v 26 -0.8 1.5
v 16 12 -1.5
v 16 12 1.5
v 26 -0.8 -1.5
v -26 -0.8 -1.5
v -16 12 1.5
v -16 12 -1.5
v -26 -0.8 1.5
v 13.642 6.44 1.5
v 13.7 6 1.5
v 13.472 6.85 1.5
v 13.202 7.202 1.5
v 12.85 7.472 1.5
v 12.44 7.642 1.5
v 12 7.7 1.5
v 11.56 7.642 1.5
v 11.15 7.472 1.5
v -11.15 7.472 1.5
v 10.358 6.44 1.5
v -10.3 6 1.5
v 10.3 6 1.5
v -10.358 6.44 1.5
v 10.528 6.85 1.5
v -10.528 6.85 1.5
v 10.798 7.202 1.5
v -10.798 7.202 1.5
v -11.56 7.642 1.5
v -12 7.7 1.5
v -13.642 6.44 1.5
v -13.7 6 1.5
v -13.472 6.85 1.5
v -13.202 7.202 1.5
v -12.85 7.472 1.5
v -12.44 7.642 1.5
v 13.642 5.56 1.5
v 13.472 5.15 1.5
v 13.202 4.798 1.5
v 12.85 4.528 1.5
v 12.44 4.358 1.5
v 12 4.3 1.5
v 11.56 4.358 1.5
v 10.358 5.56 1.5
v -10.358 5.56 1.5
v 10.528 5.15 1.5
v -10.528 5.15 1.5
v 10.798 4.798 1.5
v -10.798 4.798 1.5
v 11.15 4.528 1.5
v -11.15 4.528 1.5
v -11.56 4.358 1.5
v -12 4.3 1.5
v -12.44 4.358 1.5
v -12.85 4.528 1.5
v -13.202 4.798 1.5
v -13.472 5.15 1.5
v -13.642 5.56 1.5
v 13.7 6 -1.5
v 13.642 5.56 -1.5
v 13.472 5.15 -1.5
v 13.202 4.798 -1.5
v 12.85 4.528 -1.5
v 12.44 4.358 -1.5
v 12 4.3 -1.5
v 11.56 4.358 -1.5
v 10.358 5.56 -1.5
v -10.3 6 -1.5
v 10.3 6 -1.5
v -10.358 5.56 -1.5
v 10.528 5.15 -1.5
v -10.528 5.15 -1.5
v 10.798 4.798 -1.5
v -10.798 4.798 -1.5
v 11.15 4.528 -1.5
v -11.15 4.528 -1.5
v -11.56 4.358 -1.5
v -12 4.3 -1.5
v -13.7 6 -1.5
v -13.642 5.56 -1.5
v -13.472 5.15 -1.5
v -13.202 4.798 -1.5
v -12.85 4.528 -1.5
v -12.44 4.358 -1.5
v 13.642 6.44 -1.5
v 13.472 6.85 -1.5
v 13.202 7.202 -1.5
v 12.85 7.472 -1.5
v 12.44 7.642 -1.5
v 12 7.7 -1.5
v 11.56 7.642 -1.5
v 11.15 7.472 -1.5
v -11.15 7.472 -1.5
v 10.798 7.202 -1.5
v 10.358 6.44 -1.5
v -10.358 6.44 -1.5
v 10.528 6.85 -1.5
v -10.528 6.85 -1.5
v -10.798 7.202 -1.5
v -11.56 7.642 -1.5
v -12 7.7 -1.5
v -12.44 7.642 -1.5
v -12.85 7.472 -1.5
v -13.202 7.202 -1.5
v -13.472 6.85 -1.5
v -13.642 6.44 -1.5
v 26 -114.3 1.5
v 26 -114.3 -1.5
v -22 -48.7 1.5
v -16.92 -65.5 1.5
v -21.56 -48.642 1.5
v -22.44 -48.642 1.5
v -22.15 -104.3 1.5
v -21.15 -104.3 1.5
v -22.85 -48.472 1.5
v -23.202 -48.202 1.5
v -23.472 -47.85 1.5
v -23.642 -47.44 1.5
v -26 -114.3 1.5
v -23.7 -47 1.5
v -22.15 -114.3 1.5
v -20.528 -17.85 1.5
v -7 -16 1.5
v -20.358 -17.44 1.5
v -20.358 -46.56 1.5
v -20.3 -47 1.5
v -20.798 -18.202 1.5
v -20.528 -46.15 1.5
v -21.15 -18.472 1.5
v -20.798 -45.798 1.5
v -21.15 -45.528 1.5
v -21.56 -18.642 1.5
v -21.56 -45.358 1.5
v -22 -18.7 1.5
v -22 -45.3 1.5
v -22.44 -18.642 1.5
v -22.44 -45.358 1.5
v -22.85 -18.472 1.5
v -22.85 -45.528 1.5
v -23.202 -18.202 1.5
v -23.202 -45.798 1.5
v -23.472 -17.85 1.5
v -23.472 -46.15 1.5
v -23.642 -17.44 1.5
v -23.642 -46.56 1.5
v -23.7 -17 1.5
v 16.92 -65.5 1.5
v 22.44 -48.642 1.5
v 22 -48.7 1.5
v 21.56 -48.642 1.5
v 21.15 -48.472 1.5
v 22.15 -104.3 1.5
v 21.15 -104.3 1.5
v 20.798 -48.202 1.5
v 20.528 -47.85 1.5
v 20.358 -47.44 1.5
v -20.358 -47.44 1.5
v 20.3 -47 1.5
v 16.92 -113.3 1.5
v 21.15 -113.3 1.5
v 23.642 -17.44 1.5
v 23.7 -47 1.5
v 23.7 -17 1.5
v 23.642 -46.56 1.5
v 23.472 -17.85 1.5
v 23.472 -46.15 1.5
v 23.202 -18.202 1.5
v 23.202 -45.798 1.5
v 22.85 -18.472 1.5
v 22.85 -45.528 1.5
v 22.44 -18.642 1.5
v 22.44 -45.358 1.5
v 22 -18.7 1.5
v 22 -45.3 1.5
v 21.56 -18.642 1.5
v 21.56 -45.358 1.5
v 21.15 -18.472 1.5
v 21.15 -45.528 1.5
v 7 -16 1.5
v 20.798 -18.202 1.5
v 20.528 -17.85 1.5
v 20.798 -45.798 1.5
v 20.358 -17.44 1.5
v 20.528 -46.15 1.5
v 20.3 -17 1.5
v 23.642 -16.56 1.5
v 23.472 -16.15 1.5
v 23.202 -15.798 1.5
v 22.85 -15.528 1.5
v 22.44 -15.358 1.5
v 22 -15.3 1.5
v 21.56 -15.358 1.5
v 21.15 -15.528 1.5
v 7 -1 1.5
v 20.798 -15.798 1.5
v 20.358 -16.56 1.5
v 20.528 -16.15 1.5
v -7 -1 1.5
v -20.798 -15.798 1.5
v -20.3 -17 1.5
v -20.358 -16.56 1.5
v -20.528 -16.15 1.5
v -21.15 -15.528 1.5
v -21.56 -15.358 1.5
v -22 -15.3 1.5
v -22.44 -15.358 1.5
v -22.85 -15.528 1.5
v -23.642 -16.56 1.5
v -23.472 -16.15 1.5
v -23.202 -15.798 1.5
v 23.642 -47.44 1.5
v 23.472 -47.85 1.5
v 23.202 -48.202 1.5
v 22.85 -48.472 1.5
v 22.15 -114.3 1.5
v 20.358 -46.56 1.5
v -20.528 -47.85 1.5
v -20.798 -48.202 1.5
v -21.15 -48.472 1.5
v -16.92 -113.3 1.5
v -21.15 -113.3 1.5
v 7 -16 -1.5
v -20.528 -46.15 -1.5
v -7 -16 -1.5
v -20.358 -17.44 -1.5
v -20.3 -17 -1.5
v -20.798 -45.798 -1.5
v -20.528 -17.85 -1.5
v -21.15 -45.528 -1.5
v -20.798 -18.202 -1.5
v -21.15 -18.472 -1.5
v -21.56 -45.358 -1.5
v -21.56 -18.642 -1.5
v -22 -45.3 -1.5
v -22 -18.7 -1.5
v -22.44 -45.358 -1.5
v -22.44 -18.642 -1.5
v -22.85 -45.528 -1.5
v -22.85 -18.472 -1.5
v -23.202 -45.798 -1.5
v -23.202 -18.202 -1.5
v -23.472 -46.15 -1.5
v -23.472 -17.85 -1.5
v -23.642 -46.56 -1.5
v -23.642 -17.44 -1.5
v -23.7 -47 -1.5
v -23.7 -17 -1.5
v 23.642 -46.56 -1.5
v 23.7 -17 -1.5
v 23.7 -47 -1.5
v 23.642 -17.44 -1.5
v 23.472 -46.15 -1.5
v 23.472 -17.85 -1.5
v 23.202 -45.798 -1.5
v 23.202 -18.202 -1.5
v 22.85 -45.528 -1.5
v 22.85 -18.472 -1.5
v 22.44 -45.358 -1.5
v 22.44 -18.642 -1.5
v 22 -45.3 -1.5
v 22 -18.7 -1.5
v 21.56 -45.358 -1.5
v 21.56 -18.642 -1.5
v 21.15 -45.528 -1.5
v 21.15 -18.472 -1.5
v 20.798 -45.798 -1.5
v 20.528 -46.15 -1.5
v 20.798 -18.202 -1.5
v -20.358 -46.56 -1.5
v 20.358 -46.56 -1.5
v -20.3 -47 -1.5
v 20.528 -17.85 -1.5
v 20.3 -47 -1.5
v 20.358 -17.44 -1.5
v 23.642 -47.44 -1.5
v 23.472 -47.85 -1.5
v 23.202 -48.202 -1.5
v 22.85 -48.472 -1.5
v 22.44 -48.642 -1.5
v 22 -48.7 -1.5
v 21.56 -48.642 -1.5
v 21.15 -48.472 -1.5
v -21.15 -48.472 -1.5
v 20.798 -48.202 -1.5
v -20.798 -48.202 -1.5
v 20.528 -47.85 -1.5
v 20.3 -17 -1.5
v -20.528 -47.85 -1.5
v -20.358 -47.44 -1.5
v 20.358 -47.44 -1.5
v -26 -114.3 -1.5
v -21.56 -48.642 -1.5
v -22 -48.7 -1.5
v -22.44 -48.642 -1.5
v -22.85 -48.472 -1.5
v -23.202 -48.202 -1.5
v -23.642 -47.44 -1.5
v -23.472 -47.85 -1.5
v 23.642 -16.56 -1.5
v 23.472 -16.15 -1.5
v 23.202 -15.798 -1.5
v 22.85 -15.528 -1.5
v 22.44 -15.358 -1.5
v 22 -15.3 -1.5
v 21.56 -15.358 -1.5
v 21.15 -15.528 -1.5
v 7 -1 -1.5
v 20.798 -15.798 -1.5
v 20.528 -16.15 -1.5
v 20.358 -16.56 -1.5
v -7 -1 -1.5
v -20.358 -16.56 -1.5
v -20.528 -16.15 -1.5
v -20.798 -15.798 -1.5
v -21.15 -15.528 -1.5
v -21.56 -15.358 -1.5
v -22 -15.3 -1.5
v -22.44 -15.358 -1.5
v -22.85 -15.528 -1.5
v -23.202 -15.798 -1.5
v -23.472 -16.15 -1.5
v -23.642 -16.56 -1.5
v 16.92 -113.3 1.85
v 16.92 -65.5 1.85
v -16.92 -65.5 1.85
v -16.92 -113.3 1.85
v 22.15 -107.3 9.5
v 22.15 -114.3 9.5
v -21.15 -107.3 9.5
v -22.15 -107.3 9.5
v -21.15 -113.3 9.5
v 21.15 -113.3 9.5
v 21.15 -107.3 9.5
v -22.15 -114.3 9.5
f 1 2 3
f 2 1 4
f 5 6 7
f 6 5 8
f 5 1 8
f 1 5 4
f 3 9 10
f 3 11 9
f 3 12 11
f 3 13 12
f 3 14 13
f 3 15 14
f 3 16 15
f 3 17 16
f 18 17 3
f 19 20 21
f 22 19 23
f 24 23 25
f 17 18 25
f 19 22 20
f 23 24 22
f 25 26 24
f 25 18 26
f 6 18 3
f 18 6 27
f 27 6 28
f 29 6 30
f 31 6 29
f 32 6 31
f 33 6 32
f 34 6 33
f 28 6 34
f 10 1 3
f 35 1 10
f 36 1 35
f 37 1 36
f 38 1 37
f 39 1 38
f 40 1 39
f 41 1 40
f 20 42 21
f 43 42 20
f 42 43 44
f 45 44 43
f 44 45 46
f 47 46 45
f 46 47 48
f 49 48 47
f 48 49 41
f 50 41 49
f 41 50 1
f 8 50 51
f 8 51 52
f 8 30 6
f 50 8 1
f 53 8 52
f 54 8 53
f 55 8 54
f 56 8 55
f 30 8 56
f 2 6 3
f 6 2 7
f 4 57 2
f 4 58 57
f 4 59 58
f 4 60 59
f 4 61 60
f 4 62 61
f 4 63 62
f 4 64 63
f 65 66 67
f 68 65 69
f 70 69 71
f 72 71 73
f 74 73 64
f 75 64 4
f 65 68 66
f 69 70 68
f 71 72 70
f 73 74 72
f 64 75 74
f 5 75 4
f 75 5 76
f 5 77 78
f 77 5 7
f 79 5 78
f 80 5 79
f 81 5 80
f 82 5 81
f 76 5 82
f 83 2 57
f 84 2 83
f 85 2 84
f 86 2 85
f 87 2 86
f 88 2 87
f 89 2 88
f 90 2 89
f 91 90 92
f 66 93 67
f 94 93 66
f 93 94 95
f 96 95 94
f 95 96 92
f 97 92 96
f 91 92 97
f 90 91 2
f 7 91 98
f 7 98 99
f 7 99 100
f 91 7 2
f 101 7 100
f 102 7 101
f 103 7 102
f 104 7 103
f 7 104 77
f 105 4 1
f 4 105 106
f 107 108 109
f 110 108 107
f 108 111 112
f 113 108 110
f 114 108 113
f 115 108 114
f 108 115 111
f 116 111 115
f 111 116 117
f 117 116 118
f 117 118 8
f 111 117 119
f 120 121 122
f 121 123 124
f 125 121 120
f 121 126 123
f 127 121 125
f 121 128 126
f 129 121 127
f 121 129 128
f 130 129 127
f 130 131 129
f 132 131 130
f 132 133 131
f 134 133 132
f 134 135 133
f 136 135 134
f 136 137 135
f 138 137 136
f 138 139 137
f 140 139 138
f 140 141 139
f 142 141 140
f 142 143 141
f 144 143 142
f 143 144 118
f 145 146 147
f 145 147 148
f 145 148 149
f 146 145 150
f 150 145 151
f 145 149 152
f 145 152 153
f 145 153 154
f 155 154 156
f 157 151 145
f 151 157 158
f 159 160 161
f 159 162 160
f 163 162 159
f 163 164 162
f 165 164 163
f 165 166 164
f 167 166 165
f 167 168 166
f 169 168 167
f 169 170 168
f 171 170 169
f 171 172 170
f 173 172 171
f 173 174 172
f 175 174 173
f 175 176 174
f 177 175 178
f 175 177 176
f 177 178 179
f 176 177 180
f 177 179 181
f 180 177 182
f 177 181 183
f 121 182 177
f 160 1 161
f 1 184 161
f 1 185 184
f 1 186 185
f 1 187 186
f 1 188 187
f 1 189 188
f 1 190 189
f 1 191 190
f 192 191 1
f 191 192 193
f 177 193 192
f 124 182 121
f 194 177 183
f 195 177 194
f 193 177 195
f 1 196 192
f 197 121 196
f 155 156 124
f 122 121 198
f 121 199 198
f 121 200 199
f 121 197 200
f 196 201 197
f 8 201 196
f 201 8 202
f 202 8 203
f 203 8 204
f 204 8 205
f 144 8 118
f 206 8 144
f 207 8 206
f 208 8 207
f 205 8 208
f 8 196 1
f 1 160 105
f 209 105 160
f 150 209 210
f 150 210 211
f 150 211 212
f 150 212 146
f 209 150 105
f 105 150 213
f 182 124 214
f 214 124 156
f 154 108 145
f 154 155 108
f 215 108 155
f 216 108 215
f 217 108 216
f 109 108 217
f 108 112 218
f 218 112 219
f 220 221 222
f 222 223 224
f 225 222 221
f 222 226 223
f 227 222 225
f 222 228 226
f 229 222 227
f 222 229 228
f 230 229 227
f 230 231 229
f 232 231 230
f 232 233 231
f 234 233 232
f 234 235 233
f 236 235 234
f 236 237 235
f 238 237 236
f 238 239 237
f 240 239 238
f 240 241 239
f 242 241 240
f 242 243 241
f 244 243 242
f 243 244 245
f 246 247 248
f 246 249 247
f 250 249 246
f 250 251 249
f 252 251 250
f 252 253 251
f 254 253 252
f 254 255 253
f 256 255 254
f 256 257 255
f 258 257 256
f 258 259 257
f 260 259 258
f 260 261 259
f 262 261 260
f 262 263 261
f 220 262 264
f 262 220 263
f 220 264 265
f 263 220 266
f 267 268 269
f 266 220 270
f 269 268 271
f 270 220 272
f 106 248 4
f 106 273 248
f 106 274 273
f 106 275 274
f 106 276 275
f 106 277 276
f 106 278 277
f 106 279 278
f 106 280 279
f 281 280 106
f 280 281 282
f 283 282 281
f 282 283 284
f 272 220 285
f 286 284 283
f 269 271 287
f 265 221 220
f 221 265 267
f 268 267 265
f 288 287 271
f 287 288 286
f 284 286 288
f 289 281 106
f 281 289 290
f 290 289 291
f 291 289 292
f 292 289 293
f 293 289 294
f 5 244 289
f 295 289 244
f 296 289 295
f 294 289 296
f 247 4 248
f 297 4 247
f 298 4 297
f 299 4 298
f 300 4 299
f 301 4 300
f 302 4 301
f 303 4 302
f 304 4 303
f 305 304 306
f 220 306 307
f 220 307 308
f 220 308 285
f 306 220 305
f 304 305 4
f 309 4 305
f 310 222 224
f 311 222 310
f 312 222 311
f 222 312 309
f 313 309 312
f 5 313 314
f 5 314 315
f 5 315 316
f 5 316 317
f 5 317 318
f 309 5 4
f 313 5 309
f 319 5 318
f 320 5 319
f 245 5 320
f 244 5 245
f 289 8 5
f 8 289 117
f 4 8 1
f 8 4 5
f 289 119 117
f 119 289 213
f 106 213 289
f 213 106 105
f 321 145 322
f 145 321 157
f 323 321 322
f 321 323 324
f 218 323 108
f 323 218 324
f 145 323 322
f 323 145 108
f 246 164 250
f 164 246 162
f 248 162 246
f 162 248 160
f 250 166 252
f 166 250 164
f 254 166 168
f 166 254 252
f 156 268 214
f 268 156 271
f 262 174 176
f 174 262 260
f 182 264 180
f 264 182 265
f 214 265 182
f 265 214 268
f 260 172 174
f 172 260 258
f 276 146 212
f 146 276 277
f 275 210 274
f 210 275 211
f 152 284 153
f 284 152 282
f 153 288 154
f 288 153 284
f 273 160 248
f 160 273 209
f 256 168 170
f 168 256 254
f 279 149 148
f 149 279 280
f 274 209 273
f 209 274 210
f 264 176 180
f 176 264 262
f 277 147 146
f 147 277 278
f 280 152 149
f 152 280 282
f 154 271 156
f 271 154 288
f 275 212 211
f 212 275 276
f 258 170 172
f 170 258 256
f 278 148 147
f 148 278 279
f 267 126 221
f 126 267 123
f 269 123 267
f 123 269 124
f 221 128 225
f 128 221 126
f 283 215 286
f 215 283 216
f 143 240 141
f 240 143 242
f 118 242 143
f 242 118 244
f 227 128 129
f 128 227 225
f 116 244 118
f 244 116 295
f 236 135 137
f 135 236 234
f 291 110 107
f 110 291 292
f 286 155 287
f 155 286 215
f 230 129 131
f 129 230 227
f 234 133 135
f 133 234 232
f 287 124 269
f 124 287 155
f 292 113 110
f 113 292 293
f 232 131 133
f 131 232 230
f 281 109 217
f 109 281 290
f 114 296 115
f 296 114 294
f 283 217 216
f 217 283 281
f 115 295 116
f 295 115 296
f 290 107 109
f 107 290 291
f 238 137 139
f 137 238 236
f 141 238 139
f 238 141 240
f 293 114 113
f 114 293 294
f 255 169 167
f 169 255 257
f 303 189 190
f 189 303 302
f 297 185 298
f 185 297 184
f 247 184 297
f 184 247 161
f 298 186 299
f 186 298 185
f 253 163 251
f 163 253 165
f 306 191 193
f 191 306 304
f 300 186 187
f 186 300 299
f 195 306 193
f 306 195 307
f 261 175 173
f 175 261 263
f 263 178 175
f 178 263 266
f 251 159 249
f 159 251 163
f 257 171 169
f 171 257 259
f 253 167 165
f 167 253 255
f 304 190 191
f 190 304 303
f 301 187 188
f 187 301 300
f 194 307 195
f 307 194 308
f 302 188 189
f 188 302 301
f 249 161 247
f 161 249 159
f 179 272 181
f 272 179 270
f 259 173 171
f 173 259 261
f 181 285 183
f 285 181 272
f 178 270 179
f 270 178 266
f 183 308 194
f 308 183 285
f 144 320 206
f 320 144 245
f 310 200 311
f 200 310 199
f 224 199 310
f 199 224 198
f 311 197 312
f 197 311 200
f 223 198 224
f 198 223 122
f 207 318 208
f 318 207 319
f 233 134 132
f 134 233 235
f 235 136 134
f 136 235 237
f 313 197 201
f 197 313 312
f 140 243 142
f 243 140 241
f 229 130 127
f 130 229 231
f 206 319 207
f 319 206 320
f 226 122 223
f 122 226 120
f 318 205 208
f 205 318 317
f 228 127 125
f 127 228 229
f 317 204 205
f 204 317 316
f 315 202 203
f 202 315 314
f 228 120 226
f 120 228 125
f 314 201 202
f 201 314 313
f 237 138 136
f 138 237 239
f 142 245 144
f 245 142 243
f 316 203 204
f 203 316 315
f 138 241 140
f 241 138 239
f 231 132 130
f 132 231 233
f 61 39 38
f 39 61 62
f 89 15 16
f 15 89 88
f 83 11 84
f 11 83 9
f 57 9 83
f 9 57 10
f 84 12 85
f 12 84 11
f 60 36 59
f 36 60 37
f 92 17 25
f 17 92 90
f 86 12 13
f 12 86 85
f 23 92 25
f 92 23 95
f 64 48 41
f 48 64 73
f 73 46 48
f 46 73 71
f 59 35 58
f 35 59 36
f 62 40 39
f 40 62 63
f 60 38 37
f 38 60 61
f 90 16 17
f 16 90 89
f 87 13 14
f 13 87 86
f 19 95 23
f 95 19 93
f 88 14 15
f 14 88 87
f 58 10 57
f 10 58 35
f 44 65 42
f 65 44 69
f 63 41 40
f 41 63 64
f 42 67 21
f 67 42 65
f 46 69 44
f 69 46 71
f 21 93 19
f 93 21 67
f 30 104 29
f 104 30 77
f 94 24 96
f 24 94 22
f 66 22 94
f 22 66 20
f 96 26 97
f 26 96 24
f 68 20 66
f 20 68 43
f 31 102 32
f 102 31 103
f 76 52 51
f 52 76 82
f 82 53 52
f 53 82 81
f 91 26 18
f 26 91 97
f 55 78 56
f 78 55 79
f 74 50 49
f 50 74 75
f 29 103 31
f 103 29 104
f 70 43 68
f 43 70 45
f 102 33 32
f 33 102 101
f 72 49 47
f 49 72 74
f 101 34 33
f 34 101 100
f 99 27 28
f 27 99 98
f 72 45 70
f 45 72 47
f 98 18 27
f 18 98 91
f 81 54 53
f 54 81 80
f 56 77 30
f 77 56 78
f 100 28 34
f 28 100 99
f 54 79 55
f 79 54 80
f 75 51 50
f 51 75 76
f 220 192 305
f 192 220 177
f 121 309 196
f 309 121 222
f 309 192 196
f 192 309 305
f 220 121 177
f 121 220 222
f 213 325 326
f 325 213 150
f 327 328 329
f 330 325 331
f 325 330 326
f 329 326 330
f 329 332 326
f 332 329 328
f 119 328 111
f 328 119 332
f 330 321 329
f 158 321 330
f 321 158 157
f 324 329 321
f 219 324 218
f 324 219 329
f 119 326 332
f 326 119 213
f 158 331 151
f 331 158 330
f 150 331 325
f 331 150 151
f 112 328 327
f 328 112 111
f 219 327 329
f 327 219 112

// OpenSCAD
// file: shell_bolts.scad
include <../params.scad>

// for local tests only
shell_bottom_bolts();


module shell_bottom_bolts() {
    radius = 1.5 + clearance*2/3;
    height = 10;


    // shell + plate
    translate([inner_tube_radius * 1.1, -inner_tube_length/4, 0])
    cylinder(height, r = radius, center=true, $fn=24);

    translate([-inner_tube_radius * 1.1, -inner_tube_length/4, 0])
    cylinder(height, r = radius, center=true, $fn=24);


    // shell + plate + bottom
    translate([inner_tube_radius * 1.1, inner_tube_length/4, 0])
    cylinder(height, r = radius, center=true, $fn=24);

    translate([-inner_tube_radius * 1.1, inner_tube_length/4, 0])
    cylinder(height, r = radius, center=true, $fn=24);

    // plate + bottom
    translate([inner_tube_radius * 0.6, inner_tube_length / 2 + motor_plate_bottom_extra*2/3, 0])
    cylinder(height, r = radius, center=true, $fn=24);
    
    translate([-inner_tube_radius * 0.6, inner_tube_length / 2 + motor_plate_bottom_extra*2/3, 0])
    cylinder(height, r = radius, center=true, $fn=24);
}
// file: utils.scad
module trapezoid(len1, len2, h, thickness, top_offset_x = 0) {
    linear_extrude(height=thickness, center=true, scale = 1.0, $fn = 16) {
        polygon(points = [
            [-len1/2, -h/2],
            [len1/2, -h/2],
            [len2/2 + top_offset_x, h/2],
            [-len2/2 + top_offset_x, h/2],
        ]);
    }
}

module cut(vec=[1,0,0]){
    cube_size = 300;
    difference(){
        for(i=[0:$children-1]) {children();}
        
        base_offset = [sign(vec[0])*cube_size/2,sign(vec[1])*cube_size/2,sign(vec[2])*cube_size/2];
        
        color("#ff0000")
        translate(base_offset + vec)
        cube(cube_size,true);
    }
}
// file: ../params.scad
thickness=1;
clearance=0.3;

// params for the central screw
inner_tube_length=60;
inner_tube_radius=20;
rear_axis_radius=3;
rear_axis_length=10;
rear_axis_padding=1;
front_axis_padding=1;

// shell
cylinder_radius_margin=0.5;
shell_length = inner_tube_length + rear_axis_padding + front_axis_padding + thickness*2;
shell_radius_inner = inner_tube_radius + cylinder_radius_margin;
shell_radius_outer = shell_radius_inner + thickness;
input_hole_length=25;
input_hole_offset=5;
input_hole_width=inner_tube_radius*1;
bottom_hole_length=15;
bottom_hole_width=inner_tube_radius*0.7;

// shell base
shell_plate_width = inner_tube_radius * 1.5 + thickness * 2;
shell_plate_length = inner_tube_length + front_axis_padding + rear_axis_padding + thickness * 2;
shell_plate_thickness = 3;
shell_plate_wing_height = 10;


// middle plate
motor_plate_bottom_extra=12;


// bottom adapter
bottom_offset=-bottom_hole_length/3;


// motor
motor_total_length=71.35;
motor_block_length=47.3;
motor_block_side=42.3;
motor_block_flat_diameter=53.6;
motor_block_and_disk_length=49;
motor_disk_diameter=22;
motor_disk_length=motor_block_and_disk_length - motor_block_length;
motor_axis_length=motor_total_length - motor_block_and_disk_length;
motor_axis_diameter=5;
motor_axis_diameter_flat=4.5;
motor_axis_radius=motor_axis_diameter / 2;
motor_axis_radius_flat=motor_axis_diameter_flat - motor_axis_radius;

// motor holder
motor_support_width=50;
motor_support_height=51;
motor_support_length=54;
motor_support_hole_length=bottom_hole_length;
motor_support_hole_width=4;
motor_support_motor_hole_dist_top=9.5;
motor_support_motor_hole_center_height=motor_support_height-motor_support_motor_hole_dist_top-motor_disk_diameter/2;




reservoirH=30;

// connector male/female
plug_diameter_max=67.3;
plug_diameter_min=62;
plug_holders_diameter=64.3;
plug_holders_width=15;
plug_holders_height=1.5;
plug_guide_diameter=66.85;
plug_guide_width=16;
plug_wall_depth=1.5;
plug_height_male=17;
plug_height_female=14.5;
plug_female_offset = plug_wall_depth + 0.5;
// main file
include <../params.scad>

use <utils.scad>
use <shell_bolts.scad>


motor_plate();

w = shell_plate_width + shell_plate_wing_height * 2;
w2 = shell_plate_width;
wing_h = shell_plate_length * 0.2;
plate_len = -wing_h + motor_plate_bottom_extra + shell_plate_length + motor_block_and_disk_length + thickness + clearance;

bumper_rear_h = 8;
bumper_side_h = 8;
bumper_side_w = 10;

module motor_plate() {
    difference() {
        translate([0, motor_plate_bottom_extra, 0])
        base_plate();
        
        // payload hole
        color("#ff0000")
        translate([0, -bottom_hole_length/2 - thickness, 0])
        cube([bottom_hole_width, bottom_hole_length, 10], center=true);

        color("#ff0000")
        translate([0, -(inner_tube_length/2 + front_axis_padding + rear_axis_padding), 0])
        shell_bottom_bolts();
    }

    translate([0, -wing_h -plate_len + motor_plate_bottom_extra, shell_plate_thickness/2])
    motor_rear_bumper();
}

module base_plate() {
    // shell end of the plate
    translate([0, -wing_h/2, 0])
    trapezoid(w, w2, wing_h, shell_plate_thickness);

    // main plate
    translate([0, -wing_h - plate_len/2, 0])
    cube([w, plate_len, shell_plate_thickness], center=true);

    // motor height compensation
    comp_h = inner_tube_radius + cylinder_radius_margin + thickness - motor_block_side/2;
    translate([0, -wing_h -plate_len + motor_block_length/2 + thickness, shell_plate_thickness/2 + comp_h/2])
    cube([motor_block_side*0.8, motor_block_length + thickness, comp_h], center=true);
}

module motor_rear_bumper() {
    // rear bumper
    translate([0, thickness/2, bumper_rear_h/2])
    cube([motor_block_side + thickness * 2, thickness, bumper_rear_h], center=true);

    // left bumper
    translate([motor_block_side/2 + thickness/2, bumper_side_w/2, bumper_side_h/2])
    side_bumper(bumper_side_h, bumper_side_w);

    // right bumper
    translate([-motor_block_side/2 - thickness/2, bumper_side_w/2, bumper_side_h/2])
    side_bumper(bumper_side_h, bumper_side_w);

}

module side_bumper(bumper_side_h, bumper_side_w) {
    rotate([90,0,90])
    trapezoid(bumper_side_w, bumper_side_w * 0.7, bumper_side_h, thickness, -bumper_side_w * 0.15);
}
